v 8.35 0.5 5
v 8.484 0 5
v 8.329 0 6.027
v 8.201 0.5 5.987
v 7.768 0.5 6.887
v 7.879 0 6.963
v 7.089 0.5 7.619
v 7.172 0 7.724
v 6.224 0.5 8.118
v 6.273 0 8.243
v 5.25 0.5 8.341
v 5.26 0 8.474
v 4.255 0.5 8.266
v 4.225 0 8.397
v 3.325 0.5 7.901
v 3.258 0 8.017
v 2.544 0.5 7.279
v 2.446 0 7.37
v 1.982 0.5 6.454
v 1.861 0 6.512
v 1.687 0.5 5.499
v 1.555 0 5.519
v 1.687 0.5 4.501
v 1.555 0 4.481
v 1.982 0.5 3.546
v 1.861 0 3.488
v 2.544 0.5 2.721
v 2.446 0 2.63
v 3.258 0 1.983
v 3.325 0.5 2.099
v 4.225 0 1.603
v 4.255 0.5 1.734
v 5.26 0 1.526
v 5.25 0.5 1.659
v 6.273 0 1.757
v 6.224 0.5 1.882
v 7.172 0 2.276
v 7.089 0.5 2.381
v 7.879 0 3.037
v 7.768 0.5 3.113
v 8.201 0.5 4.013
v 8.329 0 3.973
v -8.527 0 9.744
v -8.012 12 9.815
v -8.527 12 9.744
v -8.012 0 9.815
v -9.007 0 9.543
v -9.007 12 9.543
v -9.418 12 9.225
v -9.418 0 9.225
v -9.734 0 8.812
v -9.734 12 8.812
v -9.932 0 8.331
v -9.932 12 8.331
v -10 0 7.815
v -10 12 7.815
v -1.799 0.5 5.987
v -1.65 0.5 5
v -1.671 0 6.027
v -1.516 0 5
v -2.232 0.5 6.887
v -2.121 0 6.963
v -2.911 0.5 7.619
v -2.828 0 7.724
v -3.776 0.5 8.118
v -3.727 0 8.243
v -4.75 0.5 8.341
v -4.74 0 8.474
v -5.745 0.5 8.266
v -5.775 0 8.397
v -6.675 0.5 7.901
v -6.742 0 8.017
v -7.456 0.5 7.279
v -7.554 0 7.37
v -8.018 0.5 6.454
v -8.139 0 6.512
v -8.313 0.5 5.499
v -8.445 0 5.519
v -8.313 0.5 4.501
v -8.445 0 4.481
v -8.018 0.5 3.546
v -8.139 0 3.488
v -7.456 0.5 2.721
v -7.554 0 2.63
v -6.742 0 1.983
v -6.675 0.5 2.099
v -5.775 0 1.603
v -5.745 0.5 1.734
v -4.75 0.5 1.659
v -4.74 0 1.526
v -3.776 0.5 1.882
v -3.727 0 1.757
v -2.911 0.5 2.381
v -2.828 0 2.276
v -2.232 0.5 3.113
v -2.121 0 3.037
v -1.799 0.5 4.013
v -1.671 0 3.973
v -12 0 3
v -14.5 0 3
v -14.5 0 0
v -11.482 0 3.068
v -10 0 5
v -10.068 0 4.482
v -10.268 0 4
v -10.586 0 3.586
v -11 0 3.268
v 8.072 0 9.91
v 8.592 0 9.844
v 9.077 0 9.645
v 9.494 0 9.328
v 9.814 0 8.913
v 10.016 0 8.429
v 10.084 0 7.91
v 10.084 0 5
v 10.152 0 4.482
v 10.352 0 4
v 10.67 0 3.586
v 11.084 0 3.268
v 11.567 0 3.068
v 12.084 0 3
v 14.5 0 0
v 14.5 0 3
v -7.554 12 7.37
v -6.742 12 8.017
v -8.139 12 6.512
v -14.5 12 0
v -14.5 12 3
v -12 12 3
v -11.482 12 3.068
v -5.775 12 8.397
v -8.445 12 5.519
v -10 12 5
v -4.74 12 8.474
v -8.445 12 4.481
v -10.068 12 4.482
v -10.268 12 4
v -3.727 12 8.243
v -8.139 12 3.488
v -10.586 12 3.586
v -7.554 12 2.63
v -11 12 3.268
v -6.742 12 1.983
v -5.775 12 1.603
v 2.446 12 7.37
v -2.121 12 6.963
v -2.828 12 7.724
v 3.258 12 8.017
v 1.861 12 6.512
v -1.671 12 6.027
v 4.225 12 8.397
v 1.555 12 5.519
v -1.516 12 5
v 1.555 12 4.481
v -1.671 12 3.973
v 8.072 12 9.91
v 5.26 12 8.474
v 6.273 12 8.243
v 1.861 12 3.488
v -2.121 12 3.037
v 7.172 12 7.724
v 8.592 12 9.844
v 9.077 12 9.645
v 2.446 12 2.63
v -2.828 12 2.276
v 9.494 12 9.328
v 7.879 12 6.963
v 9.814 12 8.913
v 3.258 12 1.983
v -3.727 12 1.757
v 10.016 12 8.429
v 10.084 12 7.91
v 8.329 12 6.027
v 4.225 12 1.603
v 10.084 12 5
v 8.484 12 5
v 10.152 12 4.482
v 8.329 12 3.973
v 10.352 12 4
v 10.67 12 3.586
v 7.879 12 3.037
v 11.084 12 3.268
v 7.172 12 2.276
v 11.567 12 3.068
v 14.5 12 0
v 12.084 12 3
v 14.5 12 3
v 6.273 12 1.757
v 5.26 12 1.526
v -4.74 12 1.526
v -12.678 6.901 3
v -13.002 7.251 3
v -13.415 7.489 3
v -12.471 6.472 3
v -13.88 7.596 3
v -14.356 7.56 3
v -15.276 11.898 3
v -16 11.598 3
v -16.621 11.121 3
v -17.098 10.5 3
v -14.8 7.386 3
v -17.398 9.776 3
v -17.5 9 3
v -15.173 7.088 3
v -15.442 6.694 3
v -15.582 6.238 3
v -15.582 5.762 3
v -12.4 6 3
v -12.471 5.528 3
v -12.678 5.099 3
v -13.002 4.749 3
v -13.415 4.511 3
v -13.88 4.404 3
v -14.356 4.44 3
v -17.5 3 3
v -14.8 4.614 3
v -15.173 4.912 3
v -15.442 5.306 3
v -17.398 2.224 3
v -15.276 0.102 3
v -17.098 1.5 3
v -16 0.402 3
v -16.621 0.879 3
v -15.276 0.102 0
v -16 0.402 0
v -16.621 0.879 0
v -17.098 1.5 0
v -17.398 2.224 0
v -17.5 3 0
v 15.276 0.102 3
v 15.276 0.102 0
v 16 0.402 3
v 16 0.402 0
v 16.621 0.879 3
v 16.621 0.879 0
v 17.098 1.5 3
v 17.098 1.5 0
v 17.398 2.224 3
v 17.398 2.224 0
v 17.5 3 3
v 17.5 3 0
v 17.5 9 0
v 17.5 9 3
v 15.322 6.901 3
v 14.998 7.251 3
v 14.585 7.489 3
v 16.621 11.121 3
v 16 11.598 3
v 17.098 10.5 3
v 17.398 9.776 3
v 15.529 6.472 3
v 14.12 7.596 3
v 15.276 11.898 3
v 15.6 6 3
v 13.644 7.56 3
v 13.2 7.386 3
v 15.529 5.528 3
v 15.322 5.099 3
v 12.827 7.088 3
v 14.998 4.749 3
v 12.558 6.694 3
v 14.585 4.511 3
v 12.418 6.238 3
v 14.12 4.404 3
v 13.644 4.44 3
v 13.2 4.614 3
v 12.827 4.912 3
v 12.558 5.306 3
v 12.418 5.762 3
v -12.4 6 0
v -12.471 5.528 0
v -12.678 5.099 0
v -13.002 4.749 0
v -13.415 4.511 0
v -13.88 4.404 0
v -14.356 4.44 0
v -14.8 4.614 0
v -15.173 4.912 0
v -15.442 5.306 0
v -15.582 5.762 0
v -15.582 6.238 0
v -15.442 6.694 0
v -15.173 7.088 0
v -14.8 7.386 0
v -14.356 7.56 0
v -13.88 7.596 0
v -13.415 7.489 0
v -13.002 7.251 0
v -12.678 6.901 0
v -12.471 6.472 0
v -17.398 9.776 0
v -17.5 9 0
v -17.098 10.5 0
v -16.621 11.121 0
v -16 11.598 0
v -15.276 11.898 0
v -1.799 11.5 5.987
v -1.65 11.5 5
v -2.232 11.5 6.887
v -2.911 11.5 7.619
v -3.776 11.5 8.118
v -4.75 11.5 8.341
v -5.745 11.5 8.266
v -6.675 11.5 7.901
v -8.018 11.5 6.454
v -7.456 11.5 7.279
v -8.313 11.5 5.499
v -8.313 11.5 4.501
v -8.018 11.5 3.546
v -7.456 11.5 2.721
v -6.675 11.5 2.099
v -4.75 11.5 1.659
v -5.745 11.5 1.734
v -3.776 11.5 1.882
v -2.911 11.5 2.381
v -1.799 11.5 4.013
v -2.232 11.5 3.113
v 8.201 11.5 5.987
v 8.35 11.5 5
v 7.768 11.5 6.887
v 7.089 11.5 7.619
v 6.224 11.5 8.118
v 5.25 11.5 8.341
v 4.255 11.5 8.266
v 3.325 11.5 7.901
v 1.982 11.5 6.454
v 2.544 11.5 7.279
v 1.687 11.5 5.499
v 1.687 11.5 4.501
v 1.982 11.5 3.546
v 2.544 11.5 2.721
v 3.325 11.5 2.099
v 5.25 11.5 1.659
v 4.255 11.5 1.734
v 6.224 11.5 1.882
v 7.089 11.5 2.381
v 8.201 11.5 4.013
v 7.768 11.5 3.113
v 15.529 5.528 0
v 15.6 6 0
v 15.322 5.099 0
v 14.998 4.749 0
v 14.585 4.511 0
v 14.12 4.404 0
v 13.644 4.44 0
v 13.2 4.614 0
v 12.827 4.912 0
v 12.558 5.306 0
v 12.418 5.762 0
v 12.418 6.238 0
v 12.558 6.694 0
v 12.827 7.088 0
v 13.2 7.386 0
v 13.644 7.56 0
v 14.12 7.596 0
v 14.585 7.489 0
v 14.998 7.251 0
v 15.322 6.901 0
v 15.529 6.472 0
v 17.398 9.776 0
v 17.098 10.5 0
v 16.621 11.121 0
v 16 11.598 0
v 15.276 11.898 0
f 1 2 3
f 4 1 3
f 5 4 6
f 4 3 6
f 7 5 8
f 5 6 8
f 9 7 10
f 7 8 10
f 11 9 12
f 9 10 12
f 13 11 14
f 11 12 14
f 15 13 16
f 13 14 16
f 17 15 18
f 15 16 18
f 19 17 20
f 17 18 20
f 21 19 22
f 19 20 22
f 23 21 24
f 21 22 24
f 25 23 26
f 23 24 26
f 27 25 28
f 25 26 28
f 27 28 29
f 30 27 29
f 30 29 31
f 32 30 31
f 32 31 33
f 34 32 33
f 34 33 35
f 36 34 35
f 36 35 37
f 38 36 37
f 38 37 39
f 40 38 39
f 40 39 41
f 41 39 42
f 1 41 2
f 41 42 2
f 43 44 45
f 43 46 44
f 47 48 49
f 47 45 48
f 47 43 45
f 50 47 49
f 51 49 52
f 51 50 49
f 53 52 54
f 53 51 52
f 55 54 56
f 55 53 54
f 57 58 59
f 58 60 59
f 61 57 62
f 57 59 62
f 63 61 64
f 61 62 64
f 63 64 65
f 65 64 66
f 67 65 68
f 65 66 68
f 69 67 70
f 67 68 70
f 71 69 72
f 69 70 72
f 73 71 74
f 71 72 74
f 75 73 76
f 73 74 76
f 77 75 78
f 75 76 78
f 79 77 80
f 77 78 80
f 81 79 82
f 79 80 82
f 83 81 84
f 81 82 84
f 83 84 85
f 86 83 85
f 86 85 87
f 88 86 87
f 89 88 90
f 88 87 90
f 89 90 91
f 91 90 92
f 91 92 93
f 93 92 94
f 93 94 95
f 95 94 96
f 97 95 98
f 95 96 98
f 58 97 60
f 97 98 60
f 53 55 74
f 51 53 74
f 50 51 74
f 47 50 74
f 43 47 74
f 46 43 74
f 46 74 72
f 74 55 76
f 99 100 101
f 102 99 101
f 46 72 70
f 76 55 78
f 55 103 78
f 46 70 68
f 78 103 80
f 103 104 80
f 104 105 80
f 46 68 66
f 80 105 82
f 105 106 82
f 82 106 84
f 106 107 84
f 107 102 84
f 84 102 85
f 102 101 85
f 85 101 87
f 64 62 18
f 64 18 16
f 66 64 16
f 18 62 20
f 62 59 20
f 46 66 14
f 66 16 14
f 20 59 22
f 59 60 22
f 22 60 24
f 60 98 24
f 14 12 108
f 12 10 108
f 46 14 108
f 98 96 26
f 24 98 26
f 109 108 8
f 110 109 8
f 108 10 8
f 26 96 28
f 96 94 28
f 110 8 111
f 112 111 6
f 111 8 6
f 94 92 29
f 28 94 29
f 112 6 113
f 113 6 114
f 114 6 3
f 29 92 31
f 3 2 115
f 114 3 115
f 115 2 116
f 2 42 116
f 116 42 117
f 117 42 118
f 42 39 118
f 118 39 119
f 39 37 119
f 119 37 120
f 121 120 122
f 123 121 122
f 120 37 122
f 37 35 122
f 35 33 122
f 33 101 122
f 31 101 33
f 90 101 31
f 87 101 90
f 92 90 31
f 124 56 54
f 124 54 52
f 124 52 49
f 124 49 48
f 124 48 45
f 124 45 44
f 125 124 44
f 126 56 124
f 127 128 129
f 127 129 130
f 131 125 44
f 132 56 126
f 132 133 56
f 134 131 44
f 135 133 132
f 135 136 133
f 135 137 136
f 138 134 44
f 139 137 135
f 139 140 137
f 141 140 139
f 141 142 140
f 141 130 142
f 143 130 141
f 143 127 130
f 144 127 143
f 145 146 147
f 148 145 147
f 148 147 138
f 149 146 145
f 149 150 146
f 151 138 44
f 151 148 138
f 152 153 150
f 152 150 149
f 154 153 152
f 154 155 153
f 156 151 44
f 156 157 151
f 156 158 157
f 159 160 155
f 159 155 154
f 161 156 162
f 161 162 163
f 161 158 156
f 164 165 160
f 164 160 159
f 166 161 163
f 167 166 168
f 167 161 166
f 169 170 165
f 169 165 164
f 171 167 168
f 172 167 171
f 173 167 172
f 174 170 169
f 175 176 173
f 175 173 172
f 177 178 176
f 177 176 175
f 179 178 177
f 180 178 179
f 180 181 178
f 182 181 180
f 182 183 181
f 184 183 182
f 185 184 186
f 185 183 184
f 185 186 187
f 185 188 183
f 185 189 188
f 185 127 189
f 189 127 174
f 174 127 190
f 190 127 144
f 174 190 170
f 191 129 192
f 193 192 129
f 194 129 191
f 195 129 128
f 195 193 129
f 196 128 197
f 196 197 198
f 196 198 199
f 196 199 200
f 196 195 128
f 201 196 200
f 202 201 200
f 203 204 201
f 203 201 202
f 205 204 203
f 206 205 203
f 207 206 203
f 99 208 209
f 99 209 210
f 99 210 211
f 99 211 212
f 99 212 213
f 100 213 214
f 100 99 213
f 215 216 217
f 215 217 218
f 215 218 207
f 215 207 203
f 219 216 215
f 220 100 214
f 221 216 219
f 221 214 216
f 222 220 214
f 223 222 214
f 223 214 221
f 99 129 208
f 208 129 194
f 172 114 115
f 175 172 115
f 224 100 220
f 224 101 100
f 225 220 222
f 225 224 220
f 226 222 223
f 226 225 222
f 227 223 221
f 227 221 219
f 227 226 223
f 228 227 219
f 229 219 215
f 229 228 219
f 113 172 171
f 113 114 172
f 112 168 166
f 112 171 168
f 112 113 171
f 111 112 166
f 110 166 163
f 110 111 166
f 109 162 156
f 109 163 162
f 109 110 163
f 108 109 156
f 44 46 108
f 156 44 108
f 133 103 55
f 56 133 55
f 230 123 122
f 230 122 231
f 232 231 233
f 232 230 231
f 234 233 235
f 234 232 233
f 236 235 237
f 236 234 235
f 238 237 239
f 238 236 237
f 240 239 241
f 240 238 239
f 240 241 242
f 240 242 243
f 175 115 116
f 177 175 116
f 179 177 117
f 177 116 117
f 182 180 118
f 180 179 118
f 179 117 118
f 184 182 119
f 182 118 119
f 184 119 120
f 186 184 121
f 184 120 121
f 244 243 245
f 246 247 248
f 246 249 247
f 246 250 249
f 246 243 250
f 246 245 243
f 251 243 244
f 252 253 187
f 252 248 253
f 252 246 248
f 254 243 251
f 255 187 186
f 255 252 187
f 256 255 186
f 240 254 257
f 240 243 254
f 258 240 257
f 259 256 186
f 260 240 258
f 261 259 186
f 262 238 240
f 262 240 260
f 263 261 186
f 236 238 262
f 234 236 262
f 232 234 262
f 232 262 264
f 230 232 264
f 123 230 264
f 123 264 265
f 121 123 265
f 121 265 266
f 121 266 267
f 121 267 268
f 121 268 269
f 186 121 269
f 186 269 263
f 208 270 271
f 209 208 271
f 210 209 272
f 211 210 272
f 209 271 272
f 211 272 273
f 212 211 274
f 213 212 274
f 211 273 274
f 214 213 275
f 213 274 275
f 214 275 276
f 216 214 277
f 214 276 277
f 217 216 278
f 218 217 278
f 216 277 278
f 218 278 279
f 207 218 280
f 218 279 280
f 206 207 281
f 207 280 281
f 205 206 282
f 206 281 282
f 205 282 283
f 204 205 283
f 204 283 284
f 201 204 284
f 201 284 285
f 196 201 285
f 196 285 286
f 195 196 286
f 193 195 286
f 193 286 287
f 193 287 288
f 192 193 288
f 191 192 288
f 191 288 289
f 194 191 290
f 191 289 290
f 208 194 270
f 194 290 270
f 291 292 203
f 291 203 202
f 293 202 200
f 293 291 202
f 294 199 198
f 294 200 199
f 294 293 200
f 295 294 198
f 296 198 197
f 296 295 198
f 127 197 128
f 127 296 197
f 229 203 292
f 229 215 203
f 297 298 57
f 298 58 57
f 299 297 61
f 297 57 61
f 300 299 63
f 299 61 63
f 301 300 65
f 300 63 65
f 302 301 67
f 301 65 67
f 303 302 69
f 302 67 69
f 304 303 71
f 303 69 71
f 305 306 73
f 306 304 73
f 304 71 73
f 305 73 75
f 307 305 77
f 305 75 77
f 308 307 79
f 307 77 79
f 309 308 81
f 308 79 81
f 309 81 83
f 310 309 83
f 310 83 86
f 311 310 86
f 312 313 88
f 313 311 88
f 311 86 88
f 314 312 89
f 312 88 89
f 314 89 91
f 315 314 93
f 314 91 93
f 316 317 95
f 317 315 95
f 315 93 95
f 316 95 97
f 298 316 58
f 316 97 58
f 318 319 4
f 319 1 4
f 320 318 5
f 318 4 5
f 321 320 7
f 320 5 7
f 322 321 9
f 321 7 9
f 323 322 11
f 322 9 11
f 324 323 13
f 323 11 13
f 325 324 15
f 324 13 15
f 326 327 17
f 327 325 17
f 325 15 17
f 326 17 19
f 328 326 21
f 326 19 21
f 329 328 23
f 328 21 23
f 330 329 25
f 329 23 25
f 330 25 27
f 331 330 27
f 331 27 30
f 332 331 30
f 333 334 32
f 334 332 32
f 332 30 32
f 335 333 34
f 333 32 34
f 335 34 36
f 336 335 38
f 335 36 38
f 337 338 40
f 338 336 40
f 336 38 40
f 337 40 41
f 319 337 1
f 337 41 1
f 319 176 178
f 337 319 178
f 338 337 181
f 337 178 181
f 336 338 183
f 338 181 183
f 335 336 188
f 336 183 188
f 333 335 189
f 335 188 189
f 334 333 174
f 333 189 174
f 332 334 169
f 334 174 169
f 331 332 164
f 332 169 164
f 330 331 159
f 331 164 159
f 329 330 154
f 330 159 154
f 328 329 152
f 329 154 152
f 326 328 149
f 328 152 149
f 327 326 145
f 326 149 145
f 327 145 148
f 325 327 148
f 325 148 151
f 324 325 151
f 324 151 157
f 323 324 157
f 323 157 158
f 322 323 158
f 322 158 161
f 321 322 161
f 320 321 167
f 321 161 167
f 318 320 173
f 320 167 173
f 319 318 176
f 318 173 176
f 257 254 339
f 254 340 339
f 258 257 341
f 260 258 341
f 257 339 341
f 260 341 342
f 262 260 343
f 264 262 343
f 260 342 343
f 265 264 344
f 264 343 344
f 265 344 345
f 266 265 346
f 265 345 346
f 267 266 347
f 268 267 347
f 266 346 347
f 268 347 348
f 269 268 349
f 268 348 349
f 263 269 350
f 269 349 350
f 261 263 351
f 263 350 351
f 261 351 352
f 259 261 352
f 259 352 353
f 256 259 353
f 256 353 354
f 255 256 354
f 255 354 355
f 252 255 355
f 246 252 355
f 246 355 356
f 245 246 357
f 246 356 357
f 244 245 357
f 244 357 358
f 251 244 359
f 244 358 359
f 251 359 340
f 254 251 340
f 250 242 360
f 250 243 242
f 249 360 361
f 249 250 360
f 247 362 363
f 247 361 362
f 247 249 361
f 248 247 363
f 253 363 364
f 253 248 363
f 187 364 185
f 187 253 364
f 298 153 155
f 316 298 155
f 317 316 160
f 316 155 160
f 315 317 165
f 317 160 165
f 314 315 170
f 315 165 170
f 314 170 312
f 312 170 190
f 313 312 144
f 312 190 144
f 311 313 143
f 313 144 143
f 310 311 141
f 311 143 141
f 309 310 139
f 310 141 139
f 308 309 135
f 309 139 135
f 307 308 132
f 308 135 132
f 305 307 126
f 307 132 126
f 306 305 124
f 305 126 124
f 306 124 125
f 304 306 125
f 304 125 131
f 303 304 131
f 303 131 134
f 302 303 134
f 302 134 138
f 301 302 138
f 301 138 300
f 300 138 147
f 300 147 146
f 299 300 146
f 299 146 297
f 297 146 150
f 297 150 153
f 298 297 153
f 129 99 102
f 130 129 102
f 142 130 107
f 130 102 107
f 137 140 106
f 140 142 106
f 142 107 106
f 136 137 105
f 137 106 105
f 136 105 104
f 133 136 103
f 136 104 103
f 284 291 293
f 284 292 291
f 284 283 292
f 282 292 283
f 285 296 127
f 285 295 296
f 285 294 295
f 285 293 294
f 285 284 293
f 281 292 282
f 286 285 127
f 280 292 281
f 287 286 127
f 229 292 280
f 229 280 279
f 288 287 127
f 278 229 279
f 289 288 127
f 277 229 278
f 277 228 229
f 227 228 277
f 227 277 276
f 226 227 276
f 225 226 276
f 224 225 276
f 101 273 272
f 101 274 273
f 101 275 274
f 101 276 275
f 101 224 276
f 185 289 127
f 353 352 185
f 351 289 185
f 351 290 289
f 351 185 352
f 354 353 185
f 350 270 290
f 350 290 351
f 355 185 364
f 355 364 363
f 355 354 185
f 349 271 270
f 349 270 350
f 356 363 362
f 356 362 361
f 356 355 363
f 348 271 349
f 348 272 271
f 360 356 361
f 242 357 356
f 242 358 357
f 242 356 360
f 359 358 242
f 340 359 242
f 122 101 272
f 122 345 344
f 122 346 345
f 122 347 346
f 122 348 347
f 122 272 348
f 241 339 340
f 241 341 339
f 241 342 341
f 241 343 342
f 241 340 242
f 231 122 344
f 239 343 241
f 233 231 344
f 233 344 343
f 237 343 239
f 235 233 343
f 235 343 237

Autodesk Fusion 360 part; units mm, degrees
sketch "Sketch1" plane through (0, 0, 0) normal (0, 1, 0) x (1, 0, 0)
  circle A0 centre (-5, -5) radius 3.35
  circle A1 centre (5, -5) radius 3.35
  line L0 (-10, -5) -> (-10, -7.815)
  line L1 (-8.0118, -9.815) -> (8.0725, -9.9095)
  line L2 (10.0842, -7.9096) -> (10.0842, -5)
  line L3 (-17.5, 0) -> (17.5, 0)
  line L4 (17.5, 0) -> (17.5, -3)
  line L5 (-17.5, -3) -> (-17.5, 0)
  line L6 (-12, -3) -> (-17.5, -3)
  line L7 (17.5, -3) -> (12.0842, -3)
  arc A2 (-10, -7.815) -> (-8.0118, -9.815) centre (-8, -7.815) ccw
  arc A3 (-10, -5) -> (-12, -3) centre (-12, -5) ccw
  arc A4 (8.0725, -9.9095) -> (10.0842, -7.9096) centre (8.0842, -7.9096) ccw
  arc A5 (12.0842, -3) -> (10.0842, -5) centre (12.0842, -5) ccw
  point P0 (0, -5)
  dimension "d1" = 6.7
  dimension "d2" = 35
  dimension "d12" = 3
  dimension "d13" = 2
extrude "Extrude1" add sketch "Sketch1" along normal blind 12
sketch "Sketch2" plane through (0, 0, 0) normal (0, 0, -1) x (1, 0, 0)
  line L0 (17.5, 0) -> (-17.5, 0)
  line L1 (-17.5, 0) -> (-17.5, -12)
  line L2 (-17.5, -12) -> (17.5, -12)
  line L3 (17.5, -12) -> (17.5, 0)
  circle A0 centre (-14, -6) radius 1.6
  circle A1 centre (14, -6) radius 1.6
  dimension "d6" = 3.2
  dimension "d7" = 3.2
extrude "Extrude2" cut sketch "Sketch2" against normal blind 5 contours A0 | A1
fillet "Fillet1" radius 3 4 edges at (17.5, 0, 1.5) (17.5, 12, 1.5) (-17.5, 0, 1.5) (-17.5, 12, 1.5)
chamfer "Chamfer1" distance 0.5 angle 15 2 edges at (-8.1233, 0, 3.7886) (1.8767, 0, 3.7886) measured on face at (-1.6542, 8, 5.167) measured on face at (8.3458, 8, 5.167)
chamfer "Chamfer1" distance 0.5 angle 15 2 edges at (1.8767, 12, 3.7886) (-8.1233, 12, 3.7886) measured on face at (8.3458, 8, 5.167) measured on face at (-1.6542, 8, 5.167)
